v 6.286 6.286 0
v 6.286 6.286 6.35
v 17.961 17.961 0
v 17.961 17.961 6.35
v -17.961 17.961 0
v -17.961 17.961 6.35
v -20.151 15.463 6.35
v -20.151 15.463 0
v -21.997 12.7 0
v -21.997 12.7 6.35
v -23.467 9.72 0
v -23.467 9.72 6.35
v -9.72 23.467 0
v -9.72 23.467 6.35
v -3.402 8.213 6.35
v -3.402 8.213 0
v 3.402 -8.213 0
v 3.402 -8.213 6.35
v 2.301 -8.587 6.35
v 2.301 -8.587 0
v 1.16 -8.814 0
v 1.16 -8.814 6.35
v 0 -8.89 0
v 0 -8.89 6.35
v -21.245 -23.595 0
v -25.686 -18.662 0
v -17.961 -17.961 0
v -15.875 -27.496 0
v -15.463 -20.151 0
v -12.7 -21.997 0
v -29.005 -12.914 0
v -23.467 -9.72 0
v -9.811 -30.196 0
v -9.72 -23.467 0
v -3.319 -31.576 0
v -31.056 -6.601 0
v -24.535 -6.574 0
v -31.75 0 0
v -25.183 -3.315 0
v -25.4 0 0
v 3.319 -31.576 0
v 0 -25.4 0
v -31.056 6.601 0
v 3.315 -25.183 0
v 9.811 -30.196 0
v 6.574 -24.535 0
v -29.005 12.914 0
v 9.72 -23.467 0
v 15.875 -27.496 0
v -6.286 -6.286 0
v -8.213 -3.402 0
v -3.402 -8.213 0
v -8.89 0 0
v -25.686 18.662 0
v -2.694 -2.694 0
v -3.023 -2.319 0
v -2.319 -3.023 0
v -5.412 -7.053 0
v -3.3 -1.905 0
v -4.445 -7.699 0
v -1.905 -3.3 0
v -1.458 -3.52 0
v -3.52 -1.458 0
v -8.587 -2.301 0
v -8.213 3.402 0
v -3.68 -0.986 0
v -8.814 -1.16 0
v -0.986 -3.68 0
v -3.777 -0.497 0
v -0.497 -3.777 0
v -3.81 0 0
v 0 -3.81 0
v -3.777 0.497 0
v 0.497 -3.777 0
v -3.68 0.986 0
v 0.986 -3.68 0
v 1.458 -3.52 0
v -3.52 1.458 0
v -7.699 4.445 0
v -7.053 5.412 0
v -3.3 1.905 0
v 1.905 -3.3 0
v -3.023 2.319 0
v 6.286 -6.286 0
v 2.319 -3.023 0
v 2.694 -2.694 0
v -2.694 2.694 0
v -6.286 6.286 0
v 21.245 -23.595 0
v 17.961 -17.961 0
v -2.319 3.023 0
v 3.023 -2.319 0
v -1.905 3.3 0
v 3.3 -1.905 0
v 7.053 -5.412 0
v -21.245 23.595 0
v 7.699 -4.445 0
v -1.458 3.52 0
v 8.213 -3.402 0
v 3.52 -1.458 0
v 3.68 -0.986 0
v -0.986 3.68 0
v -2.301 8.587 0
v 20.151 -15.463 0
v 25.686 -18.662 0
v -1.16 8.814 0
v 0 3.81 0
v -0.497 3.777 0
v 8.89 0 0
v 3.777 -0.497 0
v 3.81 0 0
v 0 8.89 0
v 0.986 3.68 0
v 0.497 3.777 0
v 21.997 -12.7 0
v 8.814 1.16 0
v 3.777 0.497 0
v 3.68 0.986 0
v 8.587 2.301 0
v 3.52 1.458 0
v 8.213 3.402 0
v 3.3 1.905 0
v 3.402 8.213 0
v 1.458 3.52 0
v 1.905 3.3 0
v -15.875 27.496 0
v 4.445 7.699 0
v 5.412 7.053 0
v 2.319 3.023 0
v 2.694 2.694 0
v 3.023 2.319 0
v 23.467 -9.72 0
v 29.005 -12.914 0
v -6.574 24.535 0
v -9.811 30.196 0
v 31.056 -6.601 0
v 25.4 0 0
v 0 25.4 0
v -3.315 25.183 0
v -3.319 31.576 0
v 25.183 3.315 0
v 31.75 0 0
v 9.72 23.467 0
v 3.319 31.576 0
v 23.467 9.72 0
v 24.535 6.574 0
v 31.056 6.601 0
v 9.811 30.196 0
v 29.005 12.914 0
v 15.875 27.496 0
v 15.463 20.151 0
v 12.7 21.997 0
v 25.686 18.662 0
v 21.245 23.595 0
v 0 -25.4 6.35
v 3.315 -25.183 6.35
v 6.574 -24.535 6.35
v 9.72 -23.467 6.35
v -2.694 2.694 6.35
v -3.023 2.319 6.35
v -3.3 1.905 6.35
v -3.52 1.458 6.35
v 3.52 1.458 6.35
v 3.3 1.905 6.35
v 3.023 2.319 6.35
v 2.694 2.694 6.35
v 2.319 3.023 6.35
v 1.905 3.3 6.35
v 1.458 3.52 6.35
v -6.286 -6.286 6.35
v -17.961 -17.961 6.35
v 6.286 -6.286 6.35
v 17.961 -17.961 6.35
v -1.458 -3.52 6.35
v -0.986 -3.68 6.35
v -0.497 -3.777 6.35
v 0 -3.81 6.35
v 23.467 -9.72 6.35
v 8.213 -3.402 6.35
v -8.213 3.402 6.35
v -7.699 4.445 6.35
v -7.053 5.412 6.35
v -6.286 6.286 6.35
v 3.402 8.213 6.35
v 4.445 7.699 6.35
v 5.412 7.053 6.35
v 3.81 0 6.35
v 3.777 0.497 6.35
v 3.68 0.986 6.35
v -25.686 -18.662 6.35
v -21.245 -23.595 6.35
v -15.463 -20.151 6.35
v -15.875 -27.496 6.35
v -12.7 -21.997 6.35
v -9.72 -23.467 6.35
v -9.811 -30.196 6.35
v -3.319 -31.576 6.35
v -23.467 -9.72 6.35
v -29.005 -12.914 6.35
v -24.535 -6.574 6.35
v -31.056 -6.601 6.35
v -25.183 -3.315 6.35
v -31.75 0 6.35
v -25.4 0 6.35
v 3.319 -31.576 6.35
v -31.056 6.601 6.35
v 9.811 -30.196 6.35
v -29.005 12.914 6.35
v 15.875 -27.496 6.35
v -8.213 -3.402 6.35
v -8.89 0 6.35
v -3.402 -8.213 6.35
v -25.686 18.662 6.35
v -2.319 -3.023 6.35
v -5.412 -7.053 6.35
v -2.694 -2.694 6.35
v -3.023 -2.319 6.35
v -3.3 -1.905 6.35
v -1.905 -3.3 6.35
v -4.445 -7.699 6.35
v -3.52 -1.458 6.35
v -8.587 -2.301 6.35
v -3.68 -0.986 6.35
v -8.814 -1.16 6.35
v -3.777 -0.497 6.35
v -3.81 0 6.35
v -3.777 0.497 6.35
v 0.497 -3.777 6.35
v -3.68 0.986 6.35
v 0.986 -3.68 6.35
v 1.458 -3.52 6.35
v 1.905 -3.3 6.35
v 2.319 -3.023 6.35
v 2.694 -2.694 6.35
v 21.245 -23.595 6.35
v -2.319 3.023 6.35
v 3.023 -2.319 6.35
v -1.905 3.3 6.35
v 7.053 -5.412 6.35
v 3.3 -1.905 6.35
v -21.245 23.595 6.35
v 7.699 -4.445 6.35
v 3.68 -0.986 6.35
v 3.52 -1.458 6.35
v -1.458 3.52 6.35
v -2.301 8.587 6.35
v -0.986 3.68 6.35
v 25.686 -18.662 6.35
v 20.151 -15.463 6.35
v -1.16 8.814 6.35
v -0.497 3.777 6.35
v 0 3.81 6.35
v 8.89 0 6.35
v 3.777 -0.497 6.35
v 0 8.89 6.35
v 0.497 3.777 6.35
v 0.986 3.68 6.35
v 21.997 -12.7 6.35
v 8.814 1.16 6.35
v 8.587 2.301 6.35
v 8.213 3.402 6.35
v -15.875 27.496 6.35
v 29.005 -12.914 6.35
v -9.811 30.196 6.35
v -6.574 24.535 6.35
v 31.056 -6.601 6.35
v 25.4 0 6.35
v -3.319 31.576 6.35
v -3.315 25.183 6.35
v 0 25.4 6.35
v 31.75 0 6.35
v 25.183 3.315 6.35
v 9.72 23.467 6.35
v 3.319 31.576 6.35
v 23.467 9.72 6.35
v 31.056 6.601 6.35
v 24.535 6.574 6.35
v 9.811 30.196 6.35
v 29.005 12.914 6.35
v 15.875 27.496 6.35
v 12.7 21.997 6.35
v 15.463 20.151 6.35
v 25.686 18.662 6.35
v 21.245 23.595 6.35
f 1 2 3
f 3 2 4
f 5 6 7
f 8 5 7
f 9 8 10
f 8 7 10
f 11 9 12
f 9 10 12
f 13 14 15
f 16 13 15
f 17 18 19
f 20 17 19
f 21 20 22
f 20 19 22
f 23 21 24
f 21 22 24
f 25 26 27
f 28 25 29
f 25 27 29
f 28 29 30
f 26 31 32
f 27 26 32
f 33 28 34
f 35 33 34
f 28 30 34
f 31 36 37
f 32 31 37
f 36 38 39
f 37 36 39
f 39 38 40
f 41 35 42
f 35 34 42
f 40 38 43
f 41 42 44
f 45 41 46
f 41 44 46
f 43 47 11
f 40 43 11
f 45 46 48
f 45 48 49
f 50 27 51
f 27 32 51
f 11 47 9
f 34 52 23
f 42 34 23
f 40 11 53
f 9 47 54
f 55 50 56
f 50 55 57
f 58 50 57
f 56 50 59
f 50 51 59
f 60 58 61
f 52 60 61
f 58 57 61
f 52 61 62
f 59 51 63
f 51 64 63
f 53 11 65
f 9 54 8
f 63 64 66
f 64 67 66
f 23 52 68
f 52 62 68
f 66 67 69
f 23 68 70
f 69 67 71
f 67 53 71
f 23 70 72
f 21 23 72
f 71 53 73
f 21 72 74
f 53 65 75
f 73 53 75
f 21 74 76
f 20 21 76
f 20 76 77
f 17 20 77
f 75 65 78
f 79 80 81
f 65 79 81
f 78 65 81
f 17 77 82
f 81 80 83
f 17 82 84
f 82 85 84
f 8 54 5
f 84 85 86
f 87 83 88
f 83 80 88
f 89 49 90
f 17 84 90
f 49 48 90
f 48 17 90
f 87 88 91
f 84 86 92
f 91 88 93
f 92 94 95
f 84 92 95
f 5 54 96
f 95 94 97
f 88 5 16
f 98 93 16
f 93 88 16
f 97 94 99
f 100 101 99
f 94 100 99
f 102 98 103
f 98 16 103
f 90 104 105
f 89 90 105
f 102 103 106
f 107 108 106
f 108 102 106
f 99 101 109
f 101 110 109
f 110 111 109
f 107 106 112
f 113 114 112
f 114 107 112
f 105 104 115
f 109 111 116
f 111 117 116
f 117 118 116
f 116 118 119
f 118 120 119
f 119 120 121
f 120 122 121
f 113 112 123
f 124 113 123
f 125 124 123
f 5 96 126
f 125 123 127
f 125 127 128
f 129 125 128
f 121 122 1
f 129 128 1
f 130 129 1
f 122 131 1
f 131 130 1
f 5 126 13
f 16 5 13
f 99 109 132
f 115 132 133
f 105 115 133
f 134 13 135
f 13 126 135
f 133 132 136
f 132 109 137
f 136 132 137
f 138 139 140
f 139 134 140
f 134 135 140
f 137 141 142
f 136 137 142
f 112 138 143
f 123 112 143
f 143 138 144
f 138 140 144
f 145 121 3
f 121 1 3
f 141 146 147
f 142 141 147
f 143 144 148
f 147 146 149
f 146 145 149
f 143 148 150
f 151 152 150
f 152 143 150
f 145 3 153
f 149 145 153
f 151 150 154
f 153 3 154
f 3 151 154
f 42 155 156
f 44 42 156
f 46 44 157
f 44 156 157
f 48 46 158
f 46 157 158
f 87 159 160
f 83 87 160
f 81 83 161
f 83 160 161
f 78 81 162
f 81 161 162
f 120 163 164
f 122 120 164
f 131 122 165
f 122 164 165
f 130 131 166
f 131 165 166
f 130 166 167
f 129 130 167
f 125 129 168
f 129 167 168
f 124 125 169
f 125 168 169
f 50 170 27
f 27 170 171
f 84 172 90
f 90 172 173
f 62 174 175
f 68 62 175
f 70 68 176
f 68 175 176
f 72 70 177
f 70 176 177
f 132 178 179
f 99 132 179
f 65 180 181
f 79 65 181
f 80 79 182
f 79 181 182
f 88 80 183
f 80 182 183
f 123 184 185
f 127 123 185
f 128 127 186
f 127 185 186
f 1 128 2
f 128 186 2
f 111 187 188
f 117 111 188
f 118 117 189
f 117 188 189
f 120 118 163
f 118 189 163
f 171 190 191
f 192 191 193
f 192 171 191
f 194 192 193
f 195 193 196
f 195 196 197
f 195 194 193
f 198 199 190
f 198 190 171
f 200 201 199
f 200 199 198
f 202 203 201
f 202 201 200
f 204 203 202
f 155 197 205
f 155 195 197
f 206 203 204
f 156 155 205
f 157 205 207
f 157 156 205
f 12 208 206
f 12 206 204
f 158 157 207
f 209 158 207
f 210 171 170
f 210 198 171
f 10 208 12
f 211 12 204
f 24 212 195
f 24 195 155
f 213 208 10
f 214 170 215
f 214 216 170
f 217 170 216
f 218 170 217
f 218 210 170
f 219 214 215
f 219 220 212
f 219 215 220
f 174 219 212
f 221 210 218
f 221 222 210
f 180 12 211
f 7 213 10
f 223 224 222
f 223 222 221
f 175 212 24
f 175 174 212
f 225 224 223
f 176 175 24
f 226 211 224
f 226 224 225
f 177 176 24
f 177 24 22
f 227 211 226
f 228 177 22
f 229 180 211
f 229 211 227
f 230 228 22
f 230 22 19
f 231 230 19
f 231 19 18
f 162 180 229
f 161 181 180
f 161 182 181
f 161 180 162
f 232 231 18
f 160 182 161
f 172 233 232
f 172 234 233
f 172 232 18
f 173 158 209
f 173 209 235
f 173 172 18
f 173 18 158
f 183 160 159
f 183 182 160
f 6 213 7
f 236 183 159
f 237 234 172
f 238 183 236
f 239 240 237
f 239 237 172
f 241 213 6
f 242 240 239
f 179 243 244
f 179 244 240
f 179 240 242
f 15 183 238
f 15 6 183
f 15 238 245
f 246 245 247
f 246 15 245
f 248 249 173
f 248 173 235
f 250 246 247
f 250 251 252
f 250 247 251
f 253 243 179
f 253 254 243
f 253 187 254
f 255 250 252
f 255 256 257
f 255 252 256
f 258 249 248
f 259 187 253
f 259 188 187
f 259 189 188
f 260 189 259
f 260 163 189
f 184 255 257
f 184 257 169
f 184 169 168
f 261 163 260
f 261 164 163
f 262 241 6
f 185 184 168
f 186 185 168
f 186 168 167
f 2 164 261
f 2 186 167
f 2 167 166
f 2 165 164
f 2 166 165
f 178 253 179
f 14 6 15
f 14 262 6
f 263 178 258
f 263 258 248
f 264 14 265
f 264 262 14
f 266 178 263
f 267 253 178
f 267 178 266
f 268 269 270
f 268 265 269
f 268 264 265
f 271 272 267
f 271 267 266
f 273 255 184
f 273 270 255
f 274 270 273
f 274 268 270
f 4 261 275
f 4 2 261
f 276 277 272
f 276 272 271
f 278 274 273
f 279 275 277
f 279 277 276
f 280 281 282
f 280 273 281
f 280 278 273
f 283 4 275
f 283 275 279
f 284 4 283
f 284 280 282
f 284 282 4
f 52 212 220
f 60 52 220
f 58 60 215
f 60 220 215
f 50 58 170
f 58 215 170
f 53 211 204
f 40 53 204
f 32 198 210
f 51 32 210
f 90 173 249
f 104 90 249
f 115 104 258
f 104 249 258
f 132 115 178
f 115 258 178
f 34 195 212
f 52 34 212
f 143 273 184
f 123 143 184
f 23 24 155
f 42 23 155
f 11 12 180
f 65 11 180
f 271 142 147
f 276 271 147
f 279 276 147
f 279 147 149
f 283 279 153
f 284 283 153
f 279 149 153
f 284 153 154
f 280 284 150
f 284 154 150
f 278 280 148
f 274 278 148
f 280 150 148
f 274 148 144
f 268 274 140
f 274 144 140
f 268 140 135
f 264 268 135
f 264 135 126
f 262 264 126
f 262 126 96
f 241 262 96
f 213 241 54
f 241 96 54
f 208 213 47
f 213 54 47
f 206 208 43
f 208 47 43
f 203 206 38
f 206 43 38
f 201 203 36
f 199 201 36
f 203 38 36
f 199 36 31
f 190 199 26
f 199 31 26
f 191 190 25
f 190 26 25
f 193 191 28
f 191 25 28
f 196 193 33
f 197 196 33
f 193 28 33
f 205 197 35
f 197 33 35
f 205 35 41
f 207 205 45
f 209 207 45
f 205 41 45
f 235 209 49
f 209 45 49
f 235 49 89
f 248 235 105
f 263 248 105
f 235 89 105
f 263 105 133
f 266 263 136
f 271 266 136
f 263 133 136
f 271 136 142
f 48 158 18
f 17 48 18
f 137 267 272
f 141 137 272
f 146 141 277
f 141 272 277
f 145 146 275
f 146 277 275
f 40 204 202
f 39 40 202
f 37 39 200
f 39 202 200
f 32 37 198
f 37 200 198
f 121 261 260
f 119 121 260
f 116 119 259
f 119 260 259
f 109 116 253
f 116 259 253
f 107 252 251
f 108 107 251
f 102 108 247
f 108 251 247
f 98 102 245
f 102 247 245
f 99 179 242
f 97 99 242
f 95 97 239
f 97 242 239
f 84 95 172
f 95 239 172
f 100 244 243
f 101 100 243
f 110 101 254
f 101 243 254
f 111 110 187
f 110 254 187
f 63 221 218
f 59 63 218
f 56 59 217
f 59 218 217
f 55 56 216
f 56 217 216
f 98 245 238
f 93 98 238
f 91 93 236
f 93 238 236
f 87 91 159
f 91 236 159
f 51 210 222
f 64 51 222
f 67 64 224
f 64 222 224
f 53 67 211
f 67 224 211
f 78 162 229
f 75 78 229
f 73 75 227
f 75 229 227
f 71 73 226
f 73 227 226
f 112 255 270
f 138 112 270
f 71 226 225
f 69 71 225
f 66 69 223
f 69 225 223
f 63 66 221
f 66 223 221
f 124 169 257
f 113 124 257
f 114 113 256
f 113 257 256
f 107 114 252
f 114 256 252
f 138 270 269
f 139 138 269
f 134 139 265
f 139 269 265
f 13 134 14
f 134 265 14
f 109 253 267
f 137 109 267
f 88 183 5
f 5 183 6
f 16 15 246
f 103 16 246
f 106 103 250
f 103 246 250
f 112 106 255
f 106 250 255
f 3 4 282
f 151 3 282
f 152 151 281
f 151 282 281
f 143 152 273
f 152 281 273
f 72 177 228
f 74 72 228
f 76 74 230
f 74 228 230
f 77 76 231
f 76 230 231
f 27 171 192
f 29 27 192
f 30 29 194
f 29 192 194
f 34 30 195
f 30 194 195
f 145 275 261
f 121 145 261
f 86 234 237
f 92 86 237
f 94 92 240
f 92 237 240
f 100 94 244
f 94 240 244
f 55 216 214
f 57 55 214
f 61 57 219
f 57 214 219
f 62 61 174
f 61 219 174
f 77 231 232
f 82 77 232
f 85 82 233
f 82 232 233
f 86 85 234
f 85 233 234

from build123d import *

# Parameters (mm, degrees)
F0_R     = 31.75
F1_DEPTH = 6.35
F3_DEPTH = 25.4


with BuildPart() as f1:
    # F0 (on Top) → F1 (new body)
    with BuildSketch(Plane.XY):
        Circle(F0_R)
    extrude(amount=F1_DEPTH)

    # F2 (on face) → F3 (cut)
    with BuildSketch(Plane.XY.offset(6.35)):
        with BuildLine():
            Line((-1.4580238773, 3.5199810189), (0, 0))
            Line((0, 0), (0, 3.81))
            ThreePointArc((0, 3.81), (-0.7432941269, 3.7367919183), (-1.4580238773, 3.5199810189))
        make_face()
        with BuildLine():
            ThreePointArc((3.5199810189, -1.4580238773), (3.7367919183, -0.7432941269), (3.81, 0))
            Line((3.81, 0), (0, 0))
            Line((0, 0), (3.5199810189, -1.4580238773))
        make_face()
        with BuildLine():
            Line((1.4580238773, -3.5199810189), (0, 0))
            Line((0, 0), (0, -3.81))
            ThreePointArc((0, -3.81), (0.7432941269, -3.7367919183), (1.4580238773, -3.5199810189))
        make_face()
        with BuildLine():
            Line((-3.5199810189, -1.4580238773), (0, 0))
            Line((0, 0), (-3.81, 0))
            ThreePointArc((-3.81, 0), (-3.7367919183, -0.7432941269), (-3.5199810189, -1.4580238773))
        make_face()
        with BuildLine():
            Line((-3.81, 0), (0, 0))
            Line((0, 0), (-3.5199810189, 1.4580238773))
            ThreePointArc((-3.5199810189, 1.4580238773), (-3.7367919183, 0.7432941269), (-3.81, 0))
        make_face()
        with BuildLine():
            Line((0, 0), (3.81, 0))
            ThreePointArc((3.81, 0), (3.7367919183, 0.7432941269), (3.5199810189, 1.4580238773))
            Line((3.5199810189, 1.4580238773), (0, 0))
        make_face()
        with BuildLine():
            Line((0, 0), (3.5199810189, 1.4580238773))
            ThreePointArc((3.5199810189, 1.4580238773), (3.1678992229, 2.1167225878), (2.6940768363, 2.6940768363))
            Line((2.6940768363, 2.6940768363), (0, 0))
        make_face()
        with BuildLine():
            Line((1.4580238773, 3.5199810189), (0, 0))
            Line((0, 0), (2.6940768363, 2.6940768363))
            ThreePointArc((2.6940768363, 2.6940768363), (2.1167225878, 3.1678992229), (1.4580238773, 3.5199810189))
        make_face()
        with BuildLine():
            Line((0, 3.81), (0, 0))
            Line((0, 0), (1.4580238773, 3.5199810189))
            ThreePointArc((1.4580238773, 3.5199810189), (0.7432941269, 3.7367919183), (0, 3.81))
        make_face()
        with BuildLine():
            Line((-2.6940768363, 2.6940768363), (0, 0))
            Line((0, 0), (-1.4580238773, 3.5199810189))
            ThreePointArc((-1.4580238773, 3.5199810189), (-2.1167225878, 3.1678992229), (-2.6940768363, 2.6940768363))
        make_face()
        with BuildLine():
            Line((-3.5199810189, 1.4580238773), (0, 0))
            Line((0, 0), (-2.6940768363, 2.6940768363))
            ThreePointArc((-2.6940768363, 2.6940768363), (-3.1678992229, 2.1167225878), (-3.5199810189, 1.4580238773))
        make_face()
        with BuildLine():
            Line((-1.4580238773, -3.5199810189), (0, 0))
            Line((0, 0), (-2.6940768363, -2.6940768363))
            ThreePointArc((-2.6940768363, -2.6940768363), (-2.1167225878, -3.1678992229), (-1.4580238773, -3.5199810189))
        make_face()
        with BuildLine():
            Line((-2.6940768363, -2.6940768363), (0, 0))
            Line((0, 0), (-3.5199810189, -1.4580238773))
            ThreePointArc((-3.5199810189, -1.4580238773), (-3.1678992229, -2.1167225878), (-2.6940768363, -2.6940768363))
        make_face()
        with BuildLine():
            ThreePointArc((2.6940768363, -2.6940768363), (3.1678992229, -2.1167225878), (3.5199810189, -1.4580238773))
            Line((3.5199810189, -1.4580238773), (0, 0))
            Line((0, 0), (2.6940768363, -2.6940768363))
        make_face()
        with BuildLine():
            Line((2.6940768363, -2.6940768363), (0, 0))
            Line((0, 0), (1.4580238773, -3.5199810189))
            ThreePointArc((1.4580238773, -3.5199810189), (2.1167225878, -3.1678992229), (2.6940768363, -2.6940768363))
        make_face()
        with BuildLine():
            Line((0, -3.81), (0, 0))
            Line((0, 0), (-1.4580238773, -3.5199810189))
            ThreePointArc((-1.4580238773, -3.5199810189), (-0.7432941269, -3.7367919183), (0, -3.81))
        make_face()
        with BuildLine():
            ThreePointArc((-3.4020557137, 8.213289044), (-1.7343529627, 8.7191811428), (0, 8.89))
            Line((0, 8.89), (0, 25.4))
            ThreePointArc((0, 25.4), (-4.9552941792, 24.9119461222), (-9.7201591821, 23.4665401258))
            Line((-9.7201591821, 23.4665401258), (-3.4020557137, 8.213289044))
        make_face()
        with BuildLine():
            ThreePointArc((3.4020557137, 8.213289044), (4.9390193715, 7.3917648534), (6.2861792847, 6.2861792847))
            Line((6.2861792847, 6.2861792847), (17.9605122421, 17.9605122421))
            ThreePointArc((17.9605122421, 17.9605122421), (14.1114839187, 21.1193281525), (9.7201591821, 23.4665401258))
            Line((9.7201591821, 23.4665401258), (3.4020557137, 8.213289044))
        make_face()
        with BuildLine():
            ThreePointArc((8.213289044, 3.4020557137), (8.7191811428, 1.7343529627), (8.89, 0))
            Line((8.89, 0), (25.4, 0))
            ThreePointArc((25.4, 0), (24.9119461222, 4.9552941792), (23.4665401258, 9.7201591821))
            Line((23.4665401258, 9.7201591821), (8.213289044, 3.4020557137))
        make_face()
        with BuildLine():
            Line((23.4665401258, -9.7201591821), (8.213289044, -3.4020557137))
            ThreePointArc((8.213289044, -3.4020557137), (7.3917648534, -4.9390193715), (6.2861792847, -6.2861792847))
            Line((6.2861792847, -6.2861792847), (17.9605122421, -17.9605122421))
            ThreePointArc((17.9605122421, -17.9605122421), (21.1193281525, -14.1114839187), (23.4665401258, -9.7201591821))
        make_face()
        with BuildLine():
            ThreePointArc((3.4020557137, -8.213289044), (1.7343529627, -8.7191811428), (0, -8.89))
            Line((0, -8.89), (0, -25.4))
            ThreePointArc((0, -25.4), (4.9552941792, -24.9119461222), (9.7201591821, -23.4665401258))
            Line((9.7201591821, -23.4665401258), (3.4020557137, -8.213289044))
        make_face()
        with BuildLine():
            ThreePointArc((-3.4020557137, -8.213289044), (-4.9390193715, -7.3917648534), (-6.2861792847, -6.2861792847))
            Line((-6.2861792847, -6.2861792847), (-17.9605122421, -17.9605122421))
            ThreePointArc((-17.9605122421, -17.9605122421), (-14.1114839187, -21.1193281525), (-9.7201591821, -23.4665401258))
            Line((-9.7201591821, -23.4665401258), (-3.4020557137, -8.213289044))
        make_face()
        with BuildLine():
            ThreePointArc((-8.213289044, -3.4020557137), (-8.7191811428, -1.7343529627), (-8.89, 0))
            Line((-8.89, 0), (-25.4, 0))
            ThreePointArc((-25.4, 0), (-24.9119461222, -4.9552941792), (-23.4665401258, -9.7201591821))
            Line((-23.4665401258, -9.7201591821), (-8.213289044, -3.4020557137))
        make_face()
        with BuildLine():
            ThreePointArc((-8.213289044, 3.4020557137), (-7.3917648534, 4.9390193715), (-6.2861792847, 6.2861792847))
            Line((-6.2861792847, 6.2861792847), (-17.9605122421, 17.9605122421))
            ThreePointArc((-17.9605122421, 17.9605122421), (-21.1193281525, 14.1114839187), (-23.4665401258, 9.7201591821))
            Line((-23.4665401258, 9.7201591821), (-8.213289044, 3.4020557137))
        make_face()
    extrude(amount=-F3_DEPTH, mode=Mode.SUBTRACT)


solid = f1.part
